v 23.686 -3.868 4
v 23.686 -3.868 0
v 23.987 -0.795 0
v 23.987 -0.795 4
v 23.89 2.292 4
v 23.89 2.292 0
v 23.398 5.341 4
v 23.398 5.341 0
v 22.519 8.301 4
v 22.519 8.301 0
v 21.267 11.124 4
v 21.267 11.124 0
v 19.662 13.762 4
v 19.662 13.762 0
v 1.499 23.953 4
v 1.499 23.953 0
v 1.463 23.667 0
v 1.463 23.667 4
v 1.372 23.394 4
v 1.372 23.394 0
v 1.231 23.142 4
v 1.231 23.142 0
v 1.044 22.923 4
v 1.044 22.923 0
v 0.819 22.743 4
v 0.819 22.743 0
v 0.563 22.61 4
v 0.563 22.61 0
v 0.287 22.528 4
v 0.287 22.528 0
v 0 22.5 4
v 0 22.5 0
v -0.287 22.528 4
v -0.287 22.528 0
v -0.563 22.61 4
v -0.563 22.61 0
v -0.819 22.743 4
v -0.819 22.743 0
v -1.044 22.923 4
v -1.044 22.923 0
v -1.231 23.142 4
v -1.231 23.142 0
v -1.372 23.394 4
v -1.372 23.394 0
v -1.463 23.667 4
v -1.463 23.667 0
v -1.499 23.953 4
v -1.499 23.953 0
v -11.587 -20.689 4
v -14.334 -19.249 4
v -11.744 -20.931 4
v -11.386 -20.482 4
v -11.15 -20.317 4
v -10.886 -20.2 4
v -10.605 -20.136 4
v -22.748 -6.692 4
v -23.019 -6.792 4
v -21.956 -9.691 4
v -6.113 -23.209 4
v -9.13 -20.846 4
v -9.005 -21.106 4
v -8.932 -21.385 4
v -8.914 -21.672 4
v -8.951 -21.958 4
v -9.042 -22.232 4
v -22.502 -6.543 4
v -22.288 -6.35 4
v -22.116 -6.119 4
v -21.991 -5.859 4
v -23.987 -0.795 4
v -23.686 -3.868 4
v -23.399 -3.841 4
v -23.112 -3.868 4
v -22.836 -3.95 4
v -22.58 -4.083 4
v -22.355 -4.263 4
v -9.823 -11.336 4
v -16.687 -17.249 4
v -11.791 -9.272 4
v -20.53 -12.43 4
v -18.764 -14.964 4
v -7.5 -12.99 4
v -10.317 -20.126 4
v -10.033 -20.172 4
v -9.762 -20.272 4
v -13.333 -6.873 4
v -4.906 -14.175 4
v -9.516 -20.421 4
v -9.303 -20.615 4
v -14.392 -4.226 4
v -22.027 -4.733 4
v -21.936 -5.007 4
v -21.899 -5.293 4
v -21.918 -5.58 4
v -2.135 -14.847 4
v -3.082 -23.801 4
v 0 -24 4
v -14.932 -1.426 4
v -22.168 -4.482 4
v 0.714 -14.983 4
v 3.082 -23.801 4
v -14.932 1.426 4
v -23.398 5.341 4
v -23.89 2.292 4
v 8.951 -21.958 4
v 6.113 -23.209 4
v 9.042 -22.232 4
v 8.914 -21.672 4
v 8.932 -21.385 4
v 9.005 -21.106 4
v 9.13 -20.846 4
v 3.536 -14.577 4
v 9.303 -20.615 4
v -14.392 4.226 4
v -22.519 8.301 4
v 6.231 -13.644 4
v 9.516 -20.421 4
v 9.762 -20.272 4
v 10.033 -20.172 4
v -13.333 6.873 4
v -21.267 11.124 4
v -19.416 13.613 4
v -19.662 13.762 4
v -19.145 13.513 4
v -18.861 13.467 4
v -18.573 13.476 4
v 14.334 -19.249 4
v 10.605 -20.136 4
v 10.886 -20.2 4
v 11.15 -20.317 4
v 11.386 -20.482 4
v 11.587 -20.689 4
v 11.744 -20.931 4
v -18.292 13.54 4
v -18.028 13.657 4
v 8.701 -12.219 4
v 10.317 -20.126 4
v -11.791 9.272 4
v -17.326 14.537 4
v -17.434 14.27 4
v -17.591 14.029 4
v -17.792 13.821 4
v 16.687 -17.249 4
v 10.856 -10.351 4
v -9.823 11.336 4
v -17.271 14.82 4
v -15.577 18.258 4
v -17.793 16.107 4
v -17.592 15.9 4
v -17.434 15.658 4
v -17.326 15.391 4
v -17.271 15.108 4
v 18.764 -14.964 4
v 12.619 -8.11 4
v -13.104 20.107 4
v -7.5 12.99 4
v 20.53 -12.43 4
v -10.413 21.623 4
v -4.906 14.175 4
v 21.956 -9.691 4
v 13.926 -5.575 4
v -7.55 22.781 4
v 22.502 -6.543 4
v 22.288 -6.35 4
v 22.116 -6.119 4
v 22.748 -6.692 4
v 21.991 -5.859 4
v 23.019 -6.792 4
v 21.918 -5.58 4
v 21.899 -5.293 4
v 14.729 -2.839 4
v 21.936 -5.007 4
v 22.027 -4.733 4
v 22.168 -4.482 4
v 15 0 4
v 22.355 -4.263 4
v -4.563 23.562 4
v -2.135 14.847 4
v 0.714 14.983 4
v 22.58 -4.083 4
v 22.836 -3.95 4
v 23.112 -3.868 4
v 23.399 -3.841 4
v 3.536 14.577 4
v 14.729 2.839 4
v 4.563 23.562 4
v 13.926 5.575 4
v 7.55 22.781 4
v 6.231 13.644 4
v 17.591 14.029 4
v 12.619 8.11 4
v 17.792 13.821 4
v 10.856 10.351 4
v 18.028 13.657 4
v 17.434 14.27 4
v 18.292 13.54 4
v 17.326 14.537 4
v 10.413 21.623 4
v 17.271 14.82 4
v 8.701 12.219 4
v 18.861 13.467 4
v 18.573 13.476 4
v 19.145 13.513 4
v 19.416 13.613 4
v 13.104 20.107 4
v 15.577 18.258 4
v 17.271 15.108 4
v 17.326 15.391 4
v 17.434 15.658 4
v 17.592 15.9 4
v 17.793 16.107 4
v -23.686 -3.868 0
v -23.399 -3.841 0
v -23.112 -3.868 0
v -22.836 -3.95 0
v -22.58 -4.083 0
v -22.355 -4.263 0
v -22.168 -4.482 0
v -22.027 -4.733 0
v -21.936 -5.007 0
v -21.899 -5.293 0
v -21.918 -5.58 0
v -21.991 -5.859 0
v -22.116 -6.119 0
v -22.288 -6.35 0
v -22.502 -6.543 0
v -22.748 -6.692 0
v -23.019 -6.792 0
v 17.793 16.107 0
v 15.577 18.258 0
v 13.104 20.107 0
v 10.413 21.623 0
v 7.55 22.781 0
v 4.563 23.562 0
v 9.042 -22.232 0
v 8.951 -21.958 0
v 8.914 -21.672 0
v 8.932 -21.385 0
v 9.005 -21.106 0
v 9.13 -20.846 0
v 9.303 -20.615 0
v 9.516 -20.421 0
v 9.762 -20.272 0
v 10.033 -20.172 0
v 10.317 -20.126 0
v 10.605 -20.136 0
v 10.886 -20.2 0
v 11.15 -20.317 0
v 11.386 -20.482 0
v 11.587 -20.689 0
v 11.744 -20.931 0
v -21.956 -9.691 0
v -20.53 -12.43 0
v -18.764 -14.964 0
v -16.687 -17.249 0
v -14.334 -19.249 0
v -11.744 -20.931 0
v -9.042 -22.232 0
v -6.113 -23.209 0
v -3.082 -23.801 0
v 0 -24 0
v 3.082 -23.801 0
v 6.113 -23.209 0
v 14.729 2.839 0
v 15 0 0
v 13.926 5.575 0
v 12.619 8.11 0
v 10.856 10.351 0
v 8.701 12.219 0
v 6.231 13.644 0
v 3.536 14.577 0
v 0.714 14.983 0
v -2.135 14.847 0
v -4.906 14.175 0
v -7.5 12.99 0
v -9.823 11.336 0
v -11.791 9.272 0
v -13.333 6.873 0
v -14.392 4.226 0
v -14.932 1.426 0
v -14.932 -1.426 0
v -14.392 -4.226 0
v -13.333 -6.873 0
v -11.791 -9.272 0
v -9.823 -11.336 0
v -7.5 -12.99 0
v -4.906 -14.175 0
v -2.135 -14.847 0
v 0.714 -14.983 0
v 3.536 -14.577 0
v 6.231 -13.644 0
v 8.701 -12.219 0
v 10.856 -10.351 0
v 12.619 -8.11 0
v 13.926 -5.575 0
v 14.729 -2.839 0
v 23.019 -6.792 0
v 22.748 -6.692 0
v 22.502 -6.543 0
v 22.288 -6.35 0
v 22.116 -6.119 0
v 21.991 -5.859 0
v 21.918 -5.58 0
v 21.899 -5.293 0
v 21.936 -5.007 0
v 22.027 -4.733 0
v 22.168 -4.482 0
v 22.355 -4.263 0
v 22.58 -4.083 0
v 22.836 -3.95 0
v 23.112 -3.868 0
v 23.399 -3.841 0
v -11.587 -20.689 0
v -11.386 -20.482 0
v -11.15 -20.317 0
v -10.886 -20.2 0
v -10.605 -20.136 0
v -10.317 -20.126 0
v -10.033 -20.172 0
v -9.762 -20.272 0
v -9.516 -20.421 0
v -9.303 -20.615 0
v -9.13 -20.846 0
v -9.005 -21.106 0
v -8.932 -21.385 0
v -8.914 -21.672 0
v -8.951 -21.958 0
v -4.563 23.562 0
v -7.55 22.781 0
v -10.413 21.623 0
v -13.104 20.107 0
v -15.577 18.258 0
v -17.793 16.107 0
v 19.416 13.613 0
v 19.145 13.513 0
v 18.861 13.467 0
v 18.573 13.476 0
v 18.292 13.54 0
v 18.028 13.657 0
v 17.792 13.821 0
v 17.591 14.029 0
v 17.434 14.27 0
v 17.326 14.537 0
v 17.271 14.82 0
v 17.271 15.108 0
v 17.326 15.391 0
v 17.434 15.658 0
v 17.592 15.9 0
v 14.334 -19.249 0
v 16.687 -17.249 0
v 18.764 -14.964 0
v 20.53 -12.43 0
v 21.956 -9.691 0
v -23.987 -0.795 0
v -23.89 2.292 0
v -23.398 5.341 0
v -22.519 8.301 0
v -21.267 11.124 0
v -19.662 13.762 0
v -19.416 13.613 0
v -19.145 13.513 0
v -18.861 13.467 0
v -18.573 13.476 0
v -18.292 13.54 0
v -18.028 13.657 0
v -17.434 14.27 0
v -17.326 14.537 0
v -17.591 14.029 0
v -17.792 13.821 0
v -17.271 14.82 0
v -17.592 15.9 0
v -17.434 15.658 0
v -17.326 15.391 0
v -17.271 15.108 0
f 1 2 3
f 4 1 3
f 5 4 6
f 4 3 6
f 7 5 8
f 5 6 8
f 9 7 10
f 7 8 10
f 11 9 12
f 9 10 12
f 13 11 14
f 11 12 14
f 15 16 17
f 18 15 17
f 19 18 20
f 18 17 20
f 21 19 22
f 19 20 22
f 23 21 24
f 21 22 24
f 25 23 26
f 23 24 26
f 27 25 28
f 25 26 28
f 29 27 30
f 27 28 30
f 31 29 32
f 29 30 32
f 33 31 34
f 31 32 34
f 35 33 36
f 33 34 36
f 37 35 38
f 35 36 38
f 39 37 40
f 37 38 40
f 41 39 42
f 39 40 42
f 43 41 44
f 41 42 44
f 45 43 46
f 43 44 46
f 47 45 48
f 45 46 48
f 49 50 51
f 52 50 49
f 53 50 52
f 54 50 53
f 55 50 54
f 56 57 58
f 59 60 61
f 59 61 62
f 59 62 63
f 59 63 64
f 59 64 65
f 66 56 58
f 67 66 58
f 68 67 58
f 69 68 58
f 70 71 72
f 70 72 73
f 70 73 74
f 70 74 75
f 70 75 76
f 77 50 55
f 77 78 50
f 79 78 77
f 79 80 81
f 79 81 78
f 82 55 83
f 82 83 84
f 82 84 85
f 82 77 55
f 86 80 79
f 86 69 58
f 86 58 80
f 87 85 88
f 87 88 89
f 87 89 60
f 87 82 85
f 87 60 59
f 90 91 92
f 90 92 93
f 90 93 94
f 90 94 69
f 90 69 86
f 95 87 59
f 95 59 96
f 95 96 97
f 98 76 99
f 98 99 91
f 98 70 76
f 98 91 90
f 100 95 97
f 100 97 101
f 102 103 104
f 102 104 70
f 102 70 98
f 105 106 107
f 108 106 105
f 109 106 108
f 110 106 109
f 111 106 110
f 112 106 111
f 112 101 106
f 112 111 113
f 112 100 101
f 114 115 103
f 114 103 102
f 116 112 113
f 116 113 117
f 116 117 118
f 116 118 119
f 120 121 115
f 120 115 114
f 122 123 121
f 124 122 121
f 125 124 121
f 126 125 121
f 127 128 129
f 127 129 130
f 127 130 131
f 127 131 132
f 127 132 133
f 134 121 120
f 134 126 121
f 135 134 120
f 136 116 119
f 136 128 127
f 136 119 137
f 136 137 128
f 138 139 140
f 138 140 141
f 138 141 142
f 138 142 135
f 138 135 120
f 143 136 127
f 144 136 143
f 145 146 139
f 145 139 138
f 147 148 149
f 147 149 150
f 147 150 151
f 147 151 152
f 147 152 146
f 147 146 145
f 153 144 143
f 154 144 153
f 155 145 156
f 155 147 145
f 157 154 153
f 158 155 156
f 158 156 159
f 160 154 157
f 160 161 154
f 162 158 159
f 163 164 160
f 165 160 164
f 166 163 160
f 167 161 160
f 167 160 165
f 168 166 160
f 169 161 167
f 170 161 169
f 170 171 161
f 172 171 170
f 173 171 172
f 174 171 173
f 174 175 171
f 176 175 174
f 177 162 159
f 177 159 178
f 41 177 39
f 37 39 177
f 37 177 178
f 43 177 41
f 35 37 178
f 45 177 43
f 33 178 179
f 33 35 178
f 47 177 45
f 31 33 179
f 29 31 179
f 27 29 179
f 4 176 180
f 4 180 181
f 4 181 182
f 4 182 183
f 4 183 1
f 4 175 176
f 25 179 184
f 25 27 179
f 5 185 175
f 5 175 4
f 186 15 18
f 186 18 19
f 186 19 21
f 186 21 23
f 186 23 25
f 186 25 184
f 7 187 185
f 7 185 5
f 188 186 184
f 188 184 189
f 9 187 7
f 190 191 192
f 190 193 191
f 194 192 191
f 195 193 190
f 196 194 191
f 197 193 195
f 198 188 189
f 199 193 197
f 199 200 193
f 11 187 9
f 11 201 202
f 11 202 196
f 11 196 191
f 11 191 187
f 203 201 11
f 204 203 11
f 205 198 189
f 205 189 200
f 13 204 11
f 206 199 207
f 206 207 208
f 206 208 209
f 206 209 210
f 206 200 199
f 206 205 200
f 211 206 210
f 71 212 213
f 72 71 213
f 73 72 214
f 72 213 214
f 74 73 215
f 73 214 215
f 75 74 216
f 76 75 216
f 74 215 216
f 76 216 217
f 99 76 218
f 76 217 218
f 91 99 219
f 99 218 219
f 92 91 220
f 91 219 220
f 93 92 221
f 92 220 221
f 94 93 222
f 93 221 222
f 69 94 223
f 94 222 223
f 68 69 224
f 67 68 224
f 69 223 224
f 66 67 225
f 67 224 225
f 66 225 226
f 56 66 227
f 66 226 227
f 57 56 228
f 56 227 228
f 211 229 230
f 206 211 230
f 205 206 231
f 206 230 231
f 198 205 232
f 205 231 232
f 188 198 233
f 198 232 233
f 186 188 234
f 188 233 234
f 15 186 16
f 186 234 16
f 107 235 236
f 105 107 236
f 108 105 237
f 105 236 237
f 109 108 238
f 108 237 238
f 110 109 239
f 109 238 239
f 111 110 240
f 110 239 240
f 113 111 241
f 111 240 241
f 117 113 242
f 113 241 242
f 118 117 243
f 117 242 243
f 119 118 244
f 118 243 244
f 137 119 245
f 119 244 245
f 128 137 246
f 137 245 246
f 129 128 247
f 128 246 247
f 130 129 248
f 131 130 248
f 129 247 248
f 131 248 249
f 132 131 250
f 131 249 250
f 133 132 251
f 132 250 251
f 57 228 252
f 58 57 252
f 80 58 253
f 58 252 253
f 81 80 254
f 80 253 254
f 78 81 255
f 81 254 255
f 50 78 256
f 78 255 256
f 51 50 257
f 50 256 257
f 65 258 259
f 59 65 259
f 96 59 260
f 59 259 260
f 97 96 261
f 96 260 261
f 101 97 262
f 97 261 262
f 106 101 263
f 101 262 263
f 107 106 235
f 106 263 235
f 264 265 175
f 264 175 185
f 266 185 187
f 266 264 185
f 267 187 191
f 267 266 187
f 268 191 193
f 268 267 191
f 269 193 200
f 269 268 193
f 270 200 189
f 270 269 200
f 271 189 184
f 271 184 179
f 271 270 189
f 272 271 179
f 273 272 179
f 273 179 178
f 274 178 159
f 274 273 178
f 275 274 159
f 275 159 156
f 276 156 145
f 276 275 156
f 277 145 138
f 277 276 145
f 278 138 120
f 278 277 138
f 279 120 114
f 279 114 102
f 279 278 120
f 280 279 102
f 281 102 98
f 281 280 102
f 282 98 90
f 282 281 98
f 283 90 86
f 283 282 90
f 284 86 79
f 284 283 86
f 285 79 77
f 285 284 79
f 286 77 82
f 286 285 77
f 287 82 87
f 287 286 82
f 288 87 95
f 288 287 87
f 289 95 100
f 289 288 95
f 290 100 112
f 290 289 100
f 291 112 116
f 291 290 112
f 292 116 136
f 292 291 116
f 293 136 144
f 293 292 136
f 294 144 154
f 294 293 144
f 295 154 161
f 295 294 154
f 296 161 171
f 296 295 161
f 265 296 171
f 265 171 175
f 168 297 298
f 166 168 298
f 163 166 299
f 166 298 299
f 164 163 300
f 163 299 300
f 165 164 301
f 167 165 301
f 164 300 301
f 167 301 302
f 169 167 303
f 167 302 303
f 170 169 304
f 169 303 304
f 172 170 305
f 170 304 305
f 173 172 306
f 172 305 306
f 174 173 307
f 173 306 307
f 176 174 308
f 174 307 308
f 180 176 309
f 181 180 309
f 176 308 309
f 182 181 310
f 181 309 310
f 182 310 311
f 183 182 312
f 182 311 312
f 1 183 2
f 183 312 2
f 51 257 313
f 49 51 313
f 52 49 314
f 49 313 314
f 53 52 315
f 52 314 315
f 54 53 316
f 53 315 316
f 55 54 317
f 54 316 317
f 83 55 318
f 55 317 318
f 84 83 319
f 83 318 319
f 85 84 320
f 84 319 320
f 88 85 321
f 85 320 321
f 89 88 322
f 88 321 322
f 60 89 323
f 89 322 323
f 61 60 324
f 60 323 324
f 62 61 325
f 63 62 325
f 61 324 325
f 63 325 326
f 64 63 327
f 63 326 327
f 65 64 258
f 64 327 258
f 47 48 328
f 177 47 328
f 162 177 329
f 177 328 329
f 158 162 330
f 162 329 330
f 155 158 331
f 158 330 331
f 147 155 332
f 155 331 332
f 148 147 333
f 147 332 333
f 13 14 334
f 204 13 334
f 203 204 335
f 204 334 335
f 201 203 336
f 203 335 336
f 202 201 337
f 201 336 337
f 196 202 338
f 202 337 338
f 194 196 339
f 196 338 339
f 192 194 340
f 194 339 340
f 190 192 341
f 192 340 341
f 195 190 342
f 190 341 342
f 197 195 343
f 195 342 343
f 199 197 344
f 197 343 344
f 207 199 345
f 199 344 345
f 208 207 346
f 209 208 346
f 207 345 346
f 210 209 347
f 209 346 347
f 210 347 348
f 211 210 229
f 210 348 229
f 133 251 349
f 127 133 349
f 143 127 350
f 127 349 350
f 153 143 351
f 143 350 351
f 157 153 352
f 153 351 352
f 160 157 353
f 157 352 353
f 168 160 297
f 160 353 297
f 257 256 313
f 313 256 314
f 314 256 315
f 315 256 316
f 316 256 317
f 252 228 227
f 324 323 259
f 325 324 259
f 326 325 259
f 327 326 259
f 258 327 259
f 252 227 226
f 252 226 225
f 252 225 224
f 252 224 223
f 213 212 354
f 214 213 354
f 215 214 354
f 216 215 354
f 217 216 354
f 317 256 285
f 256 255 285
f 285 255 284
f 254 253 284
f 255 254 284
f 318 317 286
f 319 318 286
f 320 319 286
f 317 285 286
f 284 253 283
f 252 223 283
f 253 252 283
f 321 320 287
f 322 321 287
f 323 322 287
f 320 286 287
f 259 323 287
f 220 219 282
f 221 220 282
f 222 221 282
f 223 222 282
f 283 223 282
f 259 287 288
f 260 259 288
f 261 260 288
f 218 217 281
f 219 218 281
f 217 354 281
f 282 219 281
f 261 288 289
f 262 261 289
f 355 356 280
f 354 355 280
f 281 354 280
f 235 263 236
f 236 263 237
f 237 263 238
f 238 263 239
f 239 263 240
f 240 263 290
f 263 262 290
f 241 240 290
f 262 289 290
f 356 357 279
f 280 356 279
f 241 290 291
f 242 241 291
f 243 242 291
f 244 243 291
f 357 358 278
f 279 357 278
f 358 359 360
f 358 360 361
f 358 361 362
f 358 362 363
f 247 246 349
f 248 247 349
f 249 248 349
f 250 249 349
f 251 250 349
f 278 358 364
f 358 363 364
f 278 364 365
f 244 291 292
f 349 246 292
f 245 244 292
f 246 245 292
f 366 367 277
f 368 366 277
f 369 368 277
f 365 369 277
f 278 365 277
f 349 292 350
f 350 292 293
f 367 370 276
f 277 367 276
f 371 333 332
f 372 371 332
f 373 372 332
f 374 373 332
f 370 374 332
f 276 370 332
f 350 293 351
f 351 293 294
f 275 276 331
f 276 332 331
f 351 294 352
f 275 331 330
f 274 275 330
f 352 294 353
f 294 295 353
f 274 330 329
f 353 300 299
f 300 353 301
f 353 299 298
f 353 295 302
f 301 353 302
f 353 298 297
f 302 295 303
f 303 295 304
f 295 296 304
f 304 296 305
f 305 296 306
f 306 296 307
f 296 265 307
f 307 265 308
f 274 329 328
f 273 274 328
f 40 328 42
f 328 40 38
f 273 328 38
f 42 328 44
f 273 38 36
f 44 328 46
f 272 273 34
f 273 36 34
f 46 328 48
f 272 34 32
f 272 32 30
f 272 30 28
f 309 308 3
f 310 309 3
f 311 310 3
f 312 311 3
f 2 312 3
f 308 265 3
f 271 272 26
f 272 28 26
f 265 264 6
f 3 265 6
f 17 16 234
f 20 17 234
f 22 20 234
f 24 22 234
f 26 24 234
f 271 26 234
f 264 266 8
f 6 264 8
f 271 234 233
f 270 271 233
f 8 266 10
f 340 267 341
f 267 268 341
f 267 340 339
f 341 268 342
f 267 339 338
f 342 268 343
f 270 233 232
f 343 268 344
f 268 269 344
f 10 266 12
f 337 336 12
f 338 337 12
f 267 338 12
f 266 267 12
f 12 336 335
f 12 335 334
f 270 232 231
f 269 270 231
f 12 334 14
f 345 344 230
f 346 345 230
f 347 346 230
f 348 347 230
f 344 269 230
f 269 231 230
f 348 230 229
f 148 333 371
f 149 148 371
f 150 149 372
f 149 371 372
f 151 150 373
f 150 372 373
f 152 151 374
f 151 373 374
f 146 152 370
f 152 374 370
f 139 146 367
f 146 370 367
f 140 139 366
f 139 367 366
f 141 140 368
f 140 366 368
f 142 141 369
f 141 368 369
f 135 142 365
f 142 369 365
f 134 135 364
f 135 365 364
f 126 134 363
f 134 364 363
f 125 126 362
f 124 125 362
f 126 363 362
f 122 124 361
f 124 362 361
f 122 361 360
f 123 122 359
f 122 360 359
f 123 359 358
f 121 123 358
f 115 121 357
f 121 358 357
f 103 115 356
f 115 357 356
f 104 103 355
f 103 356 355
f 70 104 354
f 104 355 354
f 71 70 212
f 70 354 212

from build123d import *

# Parameters (mm, degrees)
SKETCH1_R           = 15
BOSS_EXTRUDE1_DEPTH = 4


with BuildPart() as part:
    # Sketch1 → Boss-Extrude1 (new body)
    with BuildSketch(Plane.XY):
        with BuildLine():
            ThreePointArc((-1.499267399, 23.953125), (-10.413209739, 21.62325283), (-17.792529295, 16.106703613))
            ThreePointArc((-17.792529295, 16.106703613), (-17.591208356, 14.028520542), (-19.662085162, 13.762354707))
            ThreePointArc((-19.662085162, 13.762354707), (-23.398269892, 5.340502415), (-23.686188528, -3.868394111))
            ThreePointArc((-23.686188528, -3.868394111), (-21.935878024, -5.006721014), (-23.018951765, -6.791749381))
            ThreePointArc((-23.018951765, -6.791749381), (-18.763955579, -14.963755245), (-11.74366469, -20.930512169))
            ThreePointArc((-11.74366469, -20.930512169), (-9.76238413, -20.271799528), (-9.042078187, -22.231527659))
            ThreePointArc((-9.042078187, -22.231527659), (0, -24), (9.042078187, -22.231527659))
            ThreePointArc((9.042078187, -22.231527659), (9.76238413, -20.271799528), (11.74366469, -20.930512169))
            ThreePointArc((11.74366469, -20.930512169), (18.763955579, -14.963755245), (23.018951765, -6.791749381))
            ThreePointArc((23.018951765, -6.791749381), (21.935878024, -5.006721014), (23.686188528, -3.868394111))
            ThreePointArc((23.686188528, -3.868394111), (23.398269892, 5.340502415), (19.662085162, 13.762354707))
            ThreePointArc((19.662085162, 13.762354707), (17.591208356, 14.028520542), (17.792529295, 16.106703613))
            ThreePointArc((17.792529295, 16.106703613), (10.413209739, 21.62325283), (1.499267399, 23.953125))
            ThreePointArc((1.499267399, 23.953125), (0, 22.5), (-1.499267399, 23.953125))
        make_face()
        Circle(SKETCH1_R, mode=Mode.SUBTRACT)
    extrude(amount=BOSS_EXTRUDE1_DEPTH)


solid = part.part
